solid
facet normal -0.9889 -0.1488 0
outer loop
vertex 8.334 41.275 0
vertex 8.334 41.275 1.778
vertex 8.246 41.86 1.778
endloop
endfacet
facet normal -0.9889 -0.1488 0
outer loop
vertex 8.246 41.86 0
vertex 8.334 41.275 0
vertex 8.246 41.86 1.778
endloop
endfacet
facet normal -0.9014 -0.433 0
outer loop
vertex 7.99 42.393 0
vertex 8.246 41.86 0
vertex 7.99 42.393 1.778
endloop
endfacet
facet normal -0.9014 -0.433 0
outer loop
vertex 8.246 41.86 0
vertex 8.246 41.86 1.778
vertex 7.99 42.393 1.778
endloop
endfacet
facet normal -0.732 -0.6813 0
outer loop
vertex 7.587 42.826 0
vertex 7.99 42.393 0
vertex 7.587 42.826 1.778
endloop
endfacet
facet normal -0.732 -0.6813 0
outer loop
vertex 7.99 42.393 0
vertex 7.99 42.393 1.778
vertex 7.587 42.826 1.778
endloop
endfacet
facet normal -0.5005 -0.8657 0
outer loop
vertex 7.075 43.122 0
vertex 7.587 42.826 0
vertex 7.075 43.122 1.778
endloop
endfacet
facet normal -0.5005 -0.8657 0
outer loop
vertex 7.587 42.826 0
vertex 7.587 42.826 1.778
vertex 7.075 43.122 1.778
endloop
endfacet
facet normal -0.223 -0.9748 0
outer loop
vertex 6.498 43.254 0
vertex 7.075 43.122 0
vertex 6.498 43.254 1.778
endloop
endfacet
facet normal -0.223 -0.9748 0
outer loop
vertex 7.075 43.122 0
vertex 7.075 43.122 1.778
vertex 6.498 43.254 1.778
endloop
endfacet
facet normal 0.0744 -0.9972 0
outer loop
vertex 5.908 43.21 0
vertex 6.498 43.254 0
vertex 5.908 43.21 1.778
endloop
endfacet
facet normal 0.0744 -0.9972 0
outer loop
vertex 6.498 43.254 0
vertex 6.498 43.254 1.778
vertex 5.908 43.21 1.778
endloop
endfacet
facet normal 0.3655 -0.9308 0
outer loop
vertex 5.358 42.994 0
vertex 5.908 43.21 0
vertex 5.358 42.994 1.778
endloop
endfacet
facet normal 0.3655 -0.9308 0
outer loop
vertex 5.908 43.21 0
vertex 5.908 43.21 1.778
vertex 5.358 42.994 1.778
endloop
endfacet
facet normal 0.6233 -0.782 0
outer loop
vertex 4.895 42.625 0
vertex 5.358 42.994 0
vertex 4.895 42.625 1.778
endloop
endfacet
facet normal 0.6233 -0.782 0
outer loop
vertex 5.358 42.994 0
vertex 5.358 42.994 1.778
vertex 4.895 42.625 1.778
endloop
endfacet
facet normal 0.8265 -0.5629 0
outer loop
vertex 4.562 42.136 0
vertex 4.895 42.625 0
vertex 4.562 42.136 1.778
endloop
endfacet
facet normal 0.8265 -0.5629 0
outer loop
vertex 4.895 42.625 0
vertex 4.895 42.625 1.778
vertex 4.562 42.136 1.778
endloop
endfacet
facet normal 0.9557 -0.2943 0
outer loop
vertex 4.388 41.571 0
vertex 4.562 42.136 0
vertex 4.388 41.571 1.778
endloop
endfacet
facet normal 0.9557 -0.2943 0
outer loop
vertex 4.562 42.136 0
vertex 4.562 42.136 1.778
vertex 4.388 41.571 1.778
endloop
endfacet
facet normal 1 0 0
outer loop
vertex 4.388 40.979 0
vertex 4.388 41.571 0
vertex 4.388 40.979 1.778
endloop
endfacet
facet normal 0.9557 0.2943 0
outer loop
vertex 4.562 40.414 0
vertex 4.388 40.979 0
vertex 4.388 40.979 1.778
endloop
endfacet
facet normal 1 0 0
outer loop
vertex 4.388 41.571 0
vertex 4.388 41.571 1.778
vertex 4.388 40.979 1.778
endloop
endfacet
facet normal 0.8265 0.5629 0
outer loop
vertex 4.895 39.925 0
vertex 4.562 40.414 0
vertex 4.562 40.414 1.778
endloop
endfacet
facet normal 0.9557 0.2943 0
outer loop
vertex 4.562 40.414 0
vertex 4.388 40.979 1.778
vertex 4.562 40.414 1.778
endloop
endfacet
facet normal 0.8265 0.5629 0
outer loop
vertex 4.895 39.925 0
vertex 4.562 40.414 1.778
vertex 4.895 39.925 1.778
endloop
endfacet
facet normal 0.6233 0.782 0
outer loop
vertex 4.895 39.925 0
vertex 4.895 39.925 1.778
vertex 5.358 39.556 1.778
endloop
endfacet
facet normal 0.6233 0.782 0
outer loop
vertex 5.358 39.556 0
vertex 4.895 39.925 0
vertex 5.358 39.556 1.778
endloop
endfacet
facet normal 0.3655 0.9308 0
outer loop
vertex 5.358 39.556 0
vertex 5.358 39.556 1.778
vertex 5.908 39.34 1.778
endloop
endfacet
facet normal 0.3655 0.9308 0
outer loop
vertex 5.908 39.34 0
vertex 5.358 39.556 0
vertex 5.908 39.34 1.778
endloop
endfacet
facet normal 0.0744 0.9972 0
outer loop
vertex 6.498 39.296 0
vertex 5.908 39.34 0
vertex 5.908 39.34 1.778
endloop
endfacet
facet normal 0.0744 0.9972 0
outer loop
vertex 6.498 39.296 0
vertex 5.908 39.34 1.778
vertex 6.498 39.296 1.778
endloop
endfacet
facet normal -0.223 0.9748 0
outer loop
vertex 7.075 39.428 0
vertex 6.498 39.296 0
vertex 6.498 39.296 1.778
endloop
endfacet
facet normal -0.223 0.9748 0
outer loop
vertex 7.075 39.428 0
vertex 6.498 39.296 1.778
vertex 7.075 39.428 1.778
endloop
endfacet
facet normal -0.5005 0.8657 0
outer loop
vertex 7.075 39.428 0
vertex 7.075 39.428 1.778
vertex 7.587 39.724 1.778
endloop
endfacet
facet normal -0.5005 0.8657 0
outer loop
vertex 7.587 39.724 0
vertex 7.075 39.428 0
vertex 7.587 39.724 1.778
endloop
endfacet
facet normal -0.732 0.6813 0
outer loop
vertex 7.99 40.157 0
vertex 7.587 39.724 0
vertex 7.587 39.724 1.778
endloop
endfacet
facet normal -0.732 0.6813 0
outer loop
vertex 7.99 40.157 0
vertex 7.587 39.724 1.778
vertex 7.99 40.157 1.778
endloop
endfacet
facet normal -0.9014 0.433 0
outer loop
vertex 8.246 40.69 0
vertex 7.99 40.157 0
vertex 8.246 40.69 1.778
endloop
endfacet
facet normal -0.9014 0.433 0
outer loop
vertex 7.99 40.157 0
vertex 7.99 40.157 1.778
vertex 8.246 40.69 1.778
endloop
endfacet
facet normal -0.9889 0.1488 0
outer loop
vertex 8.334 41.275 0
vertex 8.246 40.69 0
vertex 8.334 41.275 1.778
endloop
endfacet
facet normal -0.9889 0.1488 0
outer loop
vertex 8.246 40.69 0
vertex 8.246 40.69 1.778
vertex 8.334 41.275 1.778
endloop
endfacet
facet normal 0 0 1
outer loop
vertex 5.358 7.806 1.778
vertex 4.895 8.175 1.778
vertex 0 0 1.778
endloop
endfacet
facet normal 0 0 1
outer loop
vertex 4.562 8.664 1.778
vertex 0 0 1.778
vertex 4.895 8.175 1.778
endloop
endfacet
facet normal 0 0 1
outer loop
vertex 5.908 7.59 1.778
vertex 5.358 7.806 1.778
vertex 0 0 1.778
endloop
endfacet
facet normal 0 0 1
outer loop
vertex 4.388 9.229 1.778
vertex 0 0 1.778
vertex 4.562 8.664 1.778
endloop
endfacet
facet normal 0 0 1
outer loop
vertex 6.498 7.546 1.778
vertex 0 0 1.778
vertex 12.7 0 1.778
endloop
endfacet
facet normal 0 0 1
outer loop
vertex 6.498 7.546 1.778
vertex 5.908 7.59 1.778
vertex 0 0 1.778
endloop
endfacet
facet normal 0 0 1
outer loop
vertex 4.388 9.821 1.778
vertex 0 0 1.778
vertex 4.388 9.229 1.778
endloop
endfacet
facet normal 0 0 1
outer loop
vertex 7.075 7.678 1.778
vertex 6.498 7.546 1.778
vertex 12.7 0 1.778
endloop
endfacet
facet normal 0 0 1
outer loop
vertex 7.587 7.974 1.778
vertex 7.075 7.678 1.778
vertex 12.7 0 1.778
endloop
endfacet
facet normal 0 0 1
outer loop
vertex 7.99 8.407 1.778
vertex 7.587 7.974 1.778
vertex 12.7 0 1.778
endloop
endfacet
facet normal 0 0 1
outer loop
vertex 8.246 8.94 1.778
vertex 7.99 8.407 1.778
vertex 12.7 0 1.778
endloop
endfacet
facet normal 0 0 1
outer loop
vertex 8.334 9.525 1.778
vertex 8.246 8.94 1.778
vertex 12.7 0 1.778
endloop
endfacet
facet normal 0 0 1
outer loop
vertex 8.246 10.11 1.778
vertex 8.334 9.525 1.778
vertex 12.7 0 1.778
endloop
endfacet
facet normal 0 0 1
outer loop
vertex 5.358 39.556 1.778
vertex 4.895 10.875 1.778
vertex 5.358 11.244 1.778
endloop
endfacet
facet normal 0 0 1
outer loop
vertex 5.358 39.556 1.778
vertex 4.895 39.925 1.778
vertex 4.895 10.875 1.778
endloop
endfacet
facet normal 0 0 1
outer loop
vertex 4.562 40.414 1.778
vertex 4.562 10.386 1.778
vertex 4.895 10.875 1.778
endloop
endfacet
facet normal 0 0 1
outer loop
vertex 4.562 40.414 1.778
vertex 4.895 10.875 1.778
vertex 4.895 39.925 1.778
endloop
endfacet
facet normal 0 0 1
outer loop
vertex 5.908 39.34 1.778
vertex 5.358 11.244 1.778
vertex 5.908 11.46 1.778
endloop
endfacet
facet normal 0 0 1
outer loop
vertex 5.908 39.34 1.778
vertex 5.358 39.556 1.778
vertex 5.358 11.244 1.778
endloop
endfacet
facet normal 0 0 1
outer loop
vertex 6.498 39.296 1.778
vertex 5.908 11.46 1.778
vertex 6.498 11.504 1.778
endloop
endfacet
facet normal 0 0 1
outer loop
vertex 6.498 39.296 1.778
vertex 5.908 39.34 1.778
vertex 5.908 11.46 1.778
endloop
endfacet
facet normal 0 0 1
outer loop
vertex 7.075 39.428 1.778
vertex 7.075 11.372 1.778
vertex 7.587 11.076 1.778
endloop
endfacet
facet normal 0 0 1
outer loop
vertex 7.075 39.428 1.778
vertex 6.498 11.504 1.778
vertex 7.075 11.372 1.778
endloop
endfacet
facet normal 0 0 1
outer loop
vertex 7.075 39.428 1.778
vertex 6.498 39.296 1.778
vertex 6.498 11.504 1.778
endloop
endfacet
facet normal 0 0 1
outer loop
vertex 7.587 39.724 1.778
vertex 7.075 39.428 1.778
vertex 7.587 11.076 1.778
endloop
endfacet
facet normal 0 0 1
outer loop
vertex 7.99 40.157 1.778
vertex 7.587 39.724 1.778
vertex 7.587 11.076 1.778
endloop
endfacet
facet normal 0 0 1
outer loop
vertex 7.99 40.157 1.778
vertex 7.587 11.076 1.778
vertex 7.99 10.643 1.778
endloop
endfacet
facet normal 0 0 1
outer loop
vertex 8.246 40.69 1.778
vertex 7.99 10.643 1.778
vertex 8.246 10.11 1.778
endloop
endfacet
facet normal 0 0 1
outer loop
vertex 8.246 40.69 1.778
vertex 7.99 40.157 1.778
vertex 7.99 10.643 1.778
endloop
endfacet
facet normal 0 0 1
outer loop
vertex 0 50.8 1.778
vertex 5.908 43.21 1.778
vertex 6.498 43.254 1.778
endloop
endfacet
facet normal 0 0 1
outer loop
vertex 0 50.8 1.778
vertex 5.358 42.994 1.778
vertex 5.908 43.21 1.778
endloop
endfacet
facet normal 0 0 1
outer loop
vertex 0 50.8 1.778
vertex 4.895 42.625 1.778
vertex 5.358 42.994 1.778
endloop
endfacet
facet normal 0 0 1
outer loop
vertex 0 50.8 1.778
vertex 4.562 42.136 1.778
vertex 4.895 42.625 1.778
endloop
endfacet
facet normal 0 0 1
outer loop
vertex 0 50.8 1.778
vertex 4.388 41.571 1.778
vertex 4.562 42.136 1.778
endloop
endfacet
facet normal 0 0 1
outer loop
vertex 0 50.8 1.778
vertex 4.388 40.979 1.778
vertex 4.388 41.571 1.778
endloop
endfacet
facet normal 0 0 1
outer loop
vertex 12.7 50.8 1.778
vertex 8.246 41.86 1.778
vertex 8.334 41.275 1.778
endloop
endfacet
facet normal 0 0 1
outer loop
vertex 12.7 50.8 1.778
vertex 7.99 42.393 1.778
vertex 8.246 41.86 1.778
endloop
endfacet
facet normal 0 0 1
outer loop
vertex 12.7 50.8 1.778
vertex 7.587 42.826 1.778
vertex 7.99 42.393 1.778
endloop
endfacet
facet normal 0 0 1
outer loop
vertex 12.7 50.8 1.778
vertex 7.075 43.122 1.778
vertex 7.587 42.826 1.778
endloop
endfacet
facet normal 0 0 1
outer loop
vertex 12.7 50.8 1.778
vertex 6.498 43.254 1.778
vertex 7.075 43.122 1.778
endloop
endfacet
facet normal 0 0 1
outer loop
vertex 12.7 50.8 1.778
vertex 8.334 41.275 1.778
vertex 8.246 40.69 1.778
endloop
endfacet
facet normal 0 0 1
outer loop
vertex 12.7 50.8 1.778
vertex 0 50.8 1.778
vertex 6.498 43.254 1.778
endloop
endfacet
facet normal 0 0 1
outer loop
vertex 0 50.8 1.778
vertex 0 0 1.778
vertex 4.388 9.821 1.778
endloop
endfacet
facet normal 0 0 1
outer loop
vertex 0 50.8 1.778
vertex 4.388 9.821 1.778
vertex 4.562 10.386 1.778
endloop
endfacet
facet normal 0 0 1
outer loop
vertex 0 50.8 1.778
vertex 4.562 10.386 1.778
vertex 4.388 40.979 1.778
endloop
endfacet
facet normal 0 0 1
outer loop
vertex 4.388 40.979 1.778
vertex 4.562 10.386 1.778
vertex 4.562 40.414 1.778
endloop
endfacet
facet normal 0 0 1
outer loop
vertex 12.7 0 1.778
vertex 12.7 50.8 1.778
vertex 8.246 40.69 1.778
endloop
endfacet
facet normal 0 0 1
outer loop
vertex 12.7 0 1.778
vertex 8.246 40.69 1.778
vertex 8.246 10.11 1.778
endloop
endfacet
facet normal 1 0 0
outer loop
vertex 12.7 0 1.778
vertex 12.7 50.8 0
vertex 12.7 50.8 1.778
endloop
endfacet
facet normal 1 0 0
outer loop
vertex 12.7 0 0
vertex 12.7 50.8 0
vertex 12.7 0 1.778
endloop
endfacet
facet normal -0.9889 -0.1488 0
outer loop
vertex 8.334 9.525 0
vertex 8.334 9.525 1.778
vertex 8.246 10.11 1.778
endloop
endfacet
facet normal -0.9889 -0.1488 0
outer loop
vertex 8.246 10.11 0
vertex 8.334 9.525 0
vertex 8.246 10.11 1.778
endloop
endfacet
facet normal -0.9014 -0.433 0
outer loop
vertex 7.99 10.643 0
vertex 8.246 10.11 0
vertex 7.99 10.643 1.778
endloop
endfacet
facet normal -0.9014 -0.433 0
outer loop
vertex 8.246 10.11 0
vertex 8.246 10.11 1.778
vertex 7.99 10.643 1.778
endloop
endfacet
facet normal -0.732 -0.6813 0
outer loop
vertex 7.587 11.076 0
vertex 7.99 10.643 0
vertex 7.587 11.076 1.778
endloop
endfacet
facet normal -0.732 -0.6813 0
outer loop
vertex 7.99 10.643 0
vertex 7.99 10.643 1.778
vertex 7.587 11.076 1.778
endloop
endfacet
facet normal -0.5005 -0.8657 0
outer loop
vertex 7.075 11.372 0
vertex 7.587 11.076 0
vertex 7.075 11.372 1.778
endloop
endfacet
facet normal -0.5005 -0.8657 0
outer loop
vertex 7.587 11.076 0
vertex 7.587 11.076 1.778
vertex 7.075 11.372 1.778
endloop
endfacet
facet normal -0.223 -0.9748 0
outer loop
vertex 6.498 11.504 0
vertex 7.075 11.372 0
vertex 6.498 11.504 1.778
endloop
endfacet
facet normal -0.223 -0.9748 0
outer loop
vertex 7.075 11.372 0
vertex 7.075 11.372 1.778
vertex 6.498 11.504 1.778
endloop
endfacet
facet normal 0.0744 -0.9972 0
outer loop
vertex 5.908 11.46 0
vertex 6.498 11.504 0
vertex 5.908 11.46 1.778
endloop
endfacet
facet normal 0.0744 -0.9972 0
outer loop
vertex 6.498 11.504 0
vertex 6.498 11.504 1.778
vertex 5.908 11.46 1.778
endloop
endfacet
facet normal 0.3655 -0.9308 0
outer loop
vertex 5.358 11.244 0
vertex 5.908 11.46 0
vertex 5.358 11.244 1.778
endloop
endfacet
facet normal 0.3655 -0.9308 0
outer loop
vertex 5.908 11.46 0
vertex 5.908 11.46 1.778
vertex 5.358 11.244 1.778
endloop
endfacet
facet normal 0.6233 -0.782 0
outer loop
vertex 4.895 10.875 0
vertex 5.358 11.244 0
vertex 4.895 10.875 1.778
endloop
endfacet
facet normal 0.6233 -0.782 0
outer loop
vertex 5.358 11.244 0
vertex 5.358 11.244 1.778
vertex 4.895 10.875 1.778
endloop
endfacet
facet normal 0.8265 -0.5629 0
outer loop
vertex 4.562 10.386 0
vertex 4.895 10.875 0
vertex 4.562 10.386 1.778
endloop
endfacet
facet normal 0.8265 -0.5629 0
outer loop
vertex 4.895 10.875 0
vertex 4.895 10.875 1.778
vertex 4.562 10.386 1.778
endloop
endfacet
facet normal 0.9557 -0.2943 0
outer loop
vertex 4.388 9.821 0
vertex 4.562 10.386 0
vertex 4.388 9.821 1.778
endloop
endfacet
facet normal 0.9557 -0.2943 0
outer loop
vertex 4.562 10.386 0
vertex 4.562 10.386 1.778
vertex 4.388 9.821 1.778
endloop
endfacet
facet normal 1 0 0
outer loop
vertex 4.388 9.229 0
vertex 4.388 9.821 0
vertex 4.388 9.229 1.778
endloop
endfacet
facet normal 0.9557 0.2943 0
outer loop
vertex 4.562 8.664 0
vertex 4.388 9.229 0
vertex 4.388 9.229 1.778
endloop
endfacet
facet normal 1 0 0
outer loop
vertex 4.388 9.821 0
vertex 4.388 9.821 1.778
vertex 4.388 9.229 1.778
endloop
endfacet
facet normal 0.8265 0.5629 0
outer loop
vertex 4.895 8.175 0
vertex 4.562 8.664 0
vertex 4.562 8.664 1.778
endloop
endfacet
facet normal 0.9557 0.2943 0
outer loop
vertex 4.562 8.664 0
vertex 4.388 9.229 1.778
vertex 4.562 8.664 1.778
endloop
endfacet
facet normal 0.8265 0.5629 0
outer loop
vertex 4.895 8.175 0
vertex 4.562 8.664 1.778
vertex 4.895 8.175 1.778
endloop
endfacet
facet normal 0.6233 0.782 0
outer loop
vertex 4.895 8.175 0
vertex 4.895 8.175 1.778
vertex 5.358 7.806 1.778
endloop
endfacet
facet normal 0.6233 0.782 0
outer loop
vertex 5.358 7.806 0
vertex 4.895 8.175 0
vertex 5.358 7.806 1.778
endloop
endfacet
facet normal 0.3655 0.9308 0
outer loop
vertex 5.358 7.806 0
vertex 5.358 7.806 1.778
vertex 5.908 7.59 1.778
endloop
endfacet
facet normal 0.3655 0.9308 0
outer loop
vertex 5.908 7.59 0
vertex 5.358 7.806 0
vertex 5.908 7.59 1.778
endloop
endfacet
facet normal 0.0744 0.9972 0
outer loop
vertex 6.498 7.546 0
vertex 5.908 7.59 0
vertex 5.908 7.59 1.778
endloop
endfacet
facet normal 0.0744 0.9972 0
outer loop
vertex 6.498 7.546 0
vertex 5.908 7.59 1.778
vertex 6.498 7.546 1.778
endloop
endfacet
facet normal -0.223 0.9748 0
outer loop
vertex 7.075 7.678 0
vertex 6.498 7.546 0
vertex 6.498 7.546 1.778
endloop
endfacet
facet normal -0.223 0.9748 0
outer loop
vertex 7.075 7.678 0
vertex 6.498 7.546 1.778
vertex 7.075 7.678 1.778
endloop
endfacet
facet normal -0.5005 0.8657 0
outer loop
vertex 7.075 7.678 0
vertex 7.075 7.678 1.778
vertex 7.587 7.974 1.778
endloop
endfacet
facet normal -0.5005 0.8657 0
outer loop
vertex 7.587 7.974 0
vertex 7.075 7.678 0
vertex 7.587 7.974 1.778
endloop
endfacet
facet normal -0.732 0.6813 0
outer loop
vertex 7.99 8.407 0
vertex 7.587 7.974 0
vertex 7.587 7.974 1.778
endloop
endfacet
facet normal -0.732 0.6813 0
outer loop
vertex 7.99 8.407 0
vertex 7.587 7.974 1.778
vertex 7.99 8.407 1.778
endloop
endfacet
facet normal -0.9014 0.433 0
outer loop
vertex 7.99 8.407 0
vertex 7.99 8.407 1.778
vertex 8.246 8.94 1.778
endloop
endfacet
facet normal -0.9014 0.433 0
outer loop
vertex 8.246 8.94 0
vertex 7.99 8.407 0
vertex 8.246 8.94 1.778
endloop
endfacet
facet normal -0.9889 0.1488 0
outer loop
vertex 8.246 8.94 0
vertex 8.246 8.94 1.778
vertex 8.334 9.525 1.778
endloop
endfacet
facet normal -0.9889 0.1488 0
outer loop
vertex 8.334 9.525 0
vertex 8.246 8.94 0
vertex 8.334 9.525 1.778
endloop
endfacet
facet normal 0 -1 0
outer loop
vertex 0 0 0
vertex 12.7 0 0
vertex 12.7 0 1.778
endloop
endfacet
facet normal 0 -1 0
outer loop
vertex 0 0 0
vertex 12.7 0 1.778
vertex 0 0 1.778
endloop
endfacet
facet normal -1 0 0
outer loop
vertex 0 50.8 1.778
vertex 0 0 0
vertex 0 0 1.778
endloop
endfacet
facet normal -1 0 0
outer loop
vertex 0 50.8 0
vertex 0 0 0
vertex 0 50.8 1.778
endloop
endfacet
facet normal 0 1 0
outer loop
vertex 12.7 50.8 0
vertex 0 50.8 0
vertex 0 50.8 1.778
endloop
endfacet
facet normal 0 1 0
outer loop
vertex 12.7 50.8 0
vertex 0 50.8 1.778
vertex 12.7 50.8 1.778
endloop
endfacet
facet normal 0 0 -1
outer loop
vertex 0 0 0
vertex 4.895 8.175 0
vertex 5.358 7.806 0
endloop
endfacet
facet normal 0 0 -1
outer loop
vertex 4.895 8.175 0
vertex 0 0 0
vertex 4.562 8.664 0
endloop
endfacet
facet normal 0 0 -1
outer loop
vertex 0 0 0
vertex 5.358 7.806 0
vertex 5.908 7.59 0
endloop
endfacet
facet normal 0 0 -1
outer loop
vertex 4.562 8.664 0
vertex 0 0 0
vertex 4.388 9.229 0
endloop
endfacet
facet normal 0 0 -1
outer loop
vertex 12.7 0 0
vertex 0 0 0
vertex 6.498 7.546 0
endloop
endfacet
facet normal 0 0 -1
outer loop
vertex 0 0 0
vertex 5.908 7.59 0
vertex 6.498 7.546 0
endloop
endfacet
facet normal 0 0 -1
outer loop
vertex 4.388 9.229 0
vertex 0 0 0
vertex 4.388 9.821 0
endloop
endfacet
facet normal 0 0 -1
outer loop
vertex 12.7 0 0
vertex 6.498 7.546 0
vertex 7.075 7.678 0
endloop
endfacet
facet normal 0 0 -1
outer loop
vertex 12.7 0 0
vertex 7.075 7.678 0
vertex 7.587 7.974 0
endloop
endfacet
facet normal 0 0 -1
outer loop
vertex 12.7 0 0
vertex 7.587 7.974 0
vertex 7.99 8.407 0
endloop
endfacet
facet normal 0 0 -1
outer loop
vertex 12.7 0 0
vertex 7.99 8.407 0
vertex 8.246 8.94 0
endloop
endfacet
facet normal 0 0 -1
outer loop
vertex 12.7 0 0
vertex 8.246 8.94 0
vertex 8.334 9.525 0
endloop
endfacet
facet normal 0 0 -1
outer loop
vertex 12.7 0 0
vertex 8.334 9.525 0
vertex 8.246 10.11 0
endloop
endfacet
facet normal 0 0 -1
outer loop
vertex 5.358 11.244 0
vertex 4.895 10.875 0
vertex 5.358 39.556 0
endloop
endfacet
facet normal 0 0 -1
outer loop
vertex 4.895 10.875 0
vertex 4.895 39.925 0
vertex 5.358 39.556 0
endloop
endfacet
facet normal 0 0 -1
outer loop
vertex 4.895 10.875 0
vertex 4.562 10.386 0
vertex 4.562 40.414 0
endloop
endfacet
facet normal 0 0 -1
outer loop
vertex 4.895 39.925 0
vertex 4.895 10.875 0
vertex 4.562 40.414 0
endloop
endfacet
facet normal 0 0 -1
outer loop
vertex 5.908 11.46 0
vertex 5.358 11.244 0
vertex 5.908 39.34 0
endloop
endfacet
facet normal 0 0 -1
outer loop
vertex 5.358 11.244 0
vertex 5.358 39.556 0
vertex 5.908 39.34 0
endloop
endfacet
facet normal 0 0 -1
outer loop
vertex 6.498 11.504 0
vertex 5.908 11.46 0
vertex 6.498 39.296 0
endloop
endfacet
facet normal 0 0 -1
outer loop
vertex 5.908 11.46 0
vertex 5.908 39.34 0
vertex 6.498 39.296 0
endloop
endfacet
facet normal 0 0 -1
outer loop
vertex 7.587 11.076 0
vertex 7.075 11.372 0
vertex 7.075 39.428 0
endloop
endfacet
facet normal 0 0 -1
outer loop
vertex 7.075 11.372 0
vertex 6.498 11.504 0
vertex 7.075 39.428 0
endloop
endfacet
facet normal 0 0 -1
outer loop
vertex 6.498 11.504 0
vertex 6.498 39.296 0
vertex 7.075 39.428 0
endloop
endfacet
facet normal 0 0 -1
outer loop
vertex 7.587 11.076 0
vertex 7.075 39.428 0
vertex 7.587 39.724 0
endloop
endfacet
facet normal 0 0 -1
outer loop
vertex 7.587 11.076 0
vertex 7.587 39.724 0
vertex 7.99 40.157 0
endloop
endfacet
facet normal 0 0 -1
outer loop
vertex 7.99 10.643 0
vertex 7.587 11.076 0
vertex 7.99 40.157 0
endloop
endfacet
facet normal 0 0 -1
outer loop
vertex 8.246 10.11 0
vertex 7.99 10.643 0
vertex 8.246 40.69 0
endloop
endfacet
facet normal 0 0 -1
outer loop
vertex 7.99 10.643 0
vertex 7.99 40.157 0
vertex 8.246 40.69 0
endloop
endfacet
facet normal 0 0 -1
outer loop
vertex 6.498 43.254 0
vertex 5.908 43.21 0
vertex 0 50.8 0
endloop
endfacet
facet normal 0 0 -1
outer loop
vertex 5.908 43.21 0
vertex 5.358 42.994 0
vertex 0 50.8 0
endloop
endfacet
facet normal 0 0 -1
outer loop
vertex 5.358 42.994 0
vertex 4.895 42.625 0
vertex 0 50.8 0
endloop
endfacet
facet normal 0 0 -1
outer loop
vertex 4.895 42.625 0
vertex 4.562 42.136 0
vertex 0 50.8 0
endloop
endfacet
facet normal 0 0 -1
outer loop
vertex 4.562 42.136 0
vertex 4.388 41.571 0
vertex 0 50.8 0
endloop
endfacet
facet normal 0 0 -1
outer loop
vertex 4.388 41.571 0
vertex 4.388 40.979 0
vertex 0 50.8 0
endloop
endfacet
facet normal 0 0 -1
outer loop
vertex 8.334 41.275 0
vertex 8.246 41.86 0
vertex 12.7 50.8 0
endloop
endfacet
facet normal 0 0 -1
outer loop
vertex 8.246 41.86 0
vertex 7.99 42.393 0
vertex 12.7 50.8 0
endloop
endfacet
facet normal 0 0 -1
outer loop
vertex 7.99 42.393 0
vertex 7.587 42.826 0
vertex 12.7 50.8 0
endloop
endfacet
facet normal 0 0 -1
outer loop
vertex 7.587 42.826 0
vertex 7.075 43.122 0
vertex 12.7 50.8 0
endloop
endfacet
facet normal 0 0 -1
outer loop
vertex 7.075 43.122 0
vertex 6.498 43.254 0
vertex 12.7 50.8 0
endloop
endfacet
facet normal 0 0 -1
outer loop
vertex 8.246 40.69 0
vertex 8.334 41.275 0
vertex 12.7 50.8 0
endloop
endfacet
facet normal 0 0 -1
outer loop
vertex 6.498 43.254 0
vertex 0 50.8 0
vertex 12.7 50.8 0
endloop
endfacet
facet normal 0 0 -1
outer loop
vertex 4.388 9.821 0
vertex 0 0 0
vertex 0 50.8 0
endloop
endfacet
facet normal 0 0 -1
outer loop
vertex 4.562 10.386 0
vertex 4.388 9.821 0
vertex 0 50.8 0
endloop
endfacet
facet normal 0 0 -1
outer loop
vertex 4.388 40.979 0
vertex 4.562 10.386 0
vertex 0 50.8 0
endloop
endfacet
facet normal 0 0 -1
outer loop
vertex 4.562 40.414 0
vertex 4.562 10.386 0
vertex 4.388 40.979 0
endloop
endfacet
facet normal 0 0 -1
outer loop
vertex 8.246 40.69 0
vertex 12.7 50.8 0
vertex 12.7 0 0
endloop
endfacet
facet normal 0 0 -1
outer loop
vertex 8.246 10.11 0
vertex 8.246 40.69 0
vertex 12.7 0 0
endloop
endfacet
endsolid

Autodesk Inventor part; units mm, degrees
ref_plane "YZ Plane" through (0, 0, 0) normal (1, 0, 0) x (0, 1, 0)
ref_plane "XZ Plane" through (0, 0, 0) normal (0, 1, 0) x (-1, 0, 0)
ref_plane "XY Plane" through (0, 0, 0) normal (0, 0, 1) x (1, 0, 0)
sketch "Sketch1" plane through (0, 0, 0) normal (0, 0, 1) x (1, 0, 0)
  line L0 (0, 50.8) -> (12.7, 50.8)
  line L1 (12.7, 50.8) -> (12.7, 0)
  line L2 (12.7, 0) -> (0, 0)
  line L3 (0, 0) -> (0, 50.8)
  dimension "d0" = 12.7
  dimension "d1" = 50.8
extrude "Extrusion1" add sketch "Sketch1" along normal blind 1.778
sketch "Sketch2" plane through (0, 0, 1.778) normal (0, 0, 1) x (1, 0, 0)
  line L0 (12.7, 0) -> (0, 0) projected
  circle A0 centre (6.35, 9.525) radius 1.9844
  dimension "d4" = 3.9688
  dimension "d5" = 9.525
extrude "Extrusion2" cut sketch "Sketch2" against normal through all
pattern_linear "Rectangular Pattern1" count 2 spacing 31.75 along (0, 1, 0) of "Extrusion2"
properties part number "SM-M05" material "Steel, Mild"
